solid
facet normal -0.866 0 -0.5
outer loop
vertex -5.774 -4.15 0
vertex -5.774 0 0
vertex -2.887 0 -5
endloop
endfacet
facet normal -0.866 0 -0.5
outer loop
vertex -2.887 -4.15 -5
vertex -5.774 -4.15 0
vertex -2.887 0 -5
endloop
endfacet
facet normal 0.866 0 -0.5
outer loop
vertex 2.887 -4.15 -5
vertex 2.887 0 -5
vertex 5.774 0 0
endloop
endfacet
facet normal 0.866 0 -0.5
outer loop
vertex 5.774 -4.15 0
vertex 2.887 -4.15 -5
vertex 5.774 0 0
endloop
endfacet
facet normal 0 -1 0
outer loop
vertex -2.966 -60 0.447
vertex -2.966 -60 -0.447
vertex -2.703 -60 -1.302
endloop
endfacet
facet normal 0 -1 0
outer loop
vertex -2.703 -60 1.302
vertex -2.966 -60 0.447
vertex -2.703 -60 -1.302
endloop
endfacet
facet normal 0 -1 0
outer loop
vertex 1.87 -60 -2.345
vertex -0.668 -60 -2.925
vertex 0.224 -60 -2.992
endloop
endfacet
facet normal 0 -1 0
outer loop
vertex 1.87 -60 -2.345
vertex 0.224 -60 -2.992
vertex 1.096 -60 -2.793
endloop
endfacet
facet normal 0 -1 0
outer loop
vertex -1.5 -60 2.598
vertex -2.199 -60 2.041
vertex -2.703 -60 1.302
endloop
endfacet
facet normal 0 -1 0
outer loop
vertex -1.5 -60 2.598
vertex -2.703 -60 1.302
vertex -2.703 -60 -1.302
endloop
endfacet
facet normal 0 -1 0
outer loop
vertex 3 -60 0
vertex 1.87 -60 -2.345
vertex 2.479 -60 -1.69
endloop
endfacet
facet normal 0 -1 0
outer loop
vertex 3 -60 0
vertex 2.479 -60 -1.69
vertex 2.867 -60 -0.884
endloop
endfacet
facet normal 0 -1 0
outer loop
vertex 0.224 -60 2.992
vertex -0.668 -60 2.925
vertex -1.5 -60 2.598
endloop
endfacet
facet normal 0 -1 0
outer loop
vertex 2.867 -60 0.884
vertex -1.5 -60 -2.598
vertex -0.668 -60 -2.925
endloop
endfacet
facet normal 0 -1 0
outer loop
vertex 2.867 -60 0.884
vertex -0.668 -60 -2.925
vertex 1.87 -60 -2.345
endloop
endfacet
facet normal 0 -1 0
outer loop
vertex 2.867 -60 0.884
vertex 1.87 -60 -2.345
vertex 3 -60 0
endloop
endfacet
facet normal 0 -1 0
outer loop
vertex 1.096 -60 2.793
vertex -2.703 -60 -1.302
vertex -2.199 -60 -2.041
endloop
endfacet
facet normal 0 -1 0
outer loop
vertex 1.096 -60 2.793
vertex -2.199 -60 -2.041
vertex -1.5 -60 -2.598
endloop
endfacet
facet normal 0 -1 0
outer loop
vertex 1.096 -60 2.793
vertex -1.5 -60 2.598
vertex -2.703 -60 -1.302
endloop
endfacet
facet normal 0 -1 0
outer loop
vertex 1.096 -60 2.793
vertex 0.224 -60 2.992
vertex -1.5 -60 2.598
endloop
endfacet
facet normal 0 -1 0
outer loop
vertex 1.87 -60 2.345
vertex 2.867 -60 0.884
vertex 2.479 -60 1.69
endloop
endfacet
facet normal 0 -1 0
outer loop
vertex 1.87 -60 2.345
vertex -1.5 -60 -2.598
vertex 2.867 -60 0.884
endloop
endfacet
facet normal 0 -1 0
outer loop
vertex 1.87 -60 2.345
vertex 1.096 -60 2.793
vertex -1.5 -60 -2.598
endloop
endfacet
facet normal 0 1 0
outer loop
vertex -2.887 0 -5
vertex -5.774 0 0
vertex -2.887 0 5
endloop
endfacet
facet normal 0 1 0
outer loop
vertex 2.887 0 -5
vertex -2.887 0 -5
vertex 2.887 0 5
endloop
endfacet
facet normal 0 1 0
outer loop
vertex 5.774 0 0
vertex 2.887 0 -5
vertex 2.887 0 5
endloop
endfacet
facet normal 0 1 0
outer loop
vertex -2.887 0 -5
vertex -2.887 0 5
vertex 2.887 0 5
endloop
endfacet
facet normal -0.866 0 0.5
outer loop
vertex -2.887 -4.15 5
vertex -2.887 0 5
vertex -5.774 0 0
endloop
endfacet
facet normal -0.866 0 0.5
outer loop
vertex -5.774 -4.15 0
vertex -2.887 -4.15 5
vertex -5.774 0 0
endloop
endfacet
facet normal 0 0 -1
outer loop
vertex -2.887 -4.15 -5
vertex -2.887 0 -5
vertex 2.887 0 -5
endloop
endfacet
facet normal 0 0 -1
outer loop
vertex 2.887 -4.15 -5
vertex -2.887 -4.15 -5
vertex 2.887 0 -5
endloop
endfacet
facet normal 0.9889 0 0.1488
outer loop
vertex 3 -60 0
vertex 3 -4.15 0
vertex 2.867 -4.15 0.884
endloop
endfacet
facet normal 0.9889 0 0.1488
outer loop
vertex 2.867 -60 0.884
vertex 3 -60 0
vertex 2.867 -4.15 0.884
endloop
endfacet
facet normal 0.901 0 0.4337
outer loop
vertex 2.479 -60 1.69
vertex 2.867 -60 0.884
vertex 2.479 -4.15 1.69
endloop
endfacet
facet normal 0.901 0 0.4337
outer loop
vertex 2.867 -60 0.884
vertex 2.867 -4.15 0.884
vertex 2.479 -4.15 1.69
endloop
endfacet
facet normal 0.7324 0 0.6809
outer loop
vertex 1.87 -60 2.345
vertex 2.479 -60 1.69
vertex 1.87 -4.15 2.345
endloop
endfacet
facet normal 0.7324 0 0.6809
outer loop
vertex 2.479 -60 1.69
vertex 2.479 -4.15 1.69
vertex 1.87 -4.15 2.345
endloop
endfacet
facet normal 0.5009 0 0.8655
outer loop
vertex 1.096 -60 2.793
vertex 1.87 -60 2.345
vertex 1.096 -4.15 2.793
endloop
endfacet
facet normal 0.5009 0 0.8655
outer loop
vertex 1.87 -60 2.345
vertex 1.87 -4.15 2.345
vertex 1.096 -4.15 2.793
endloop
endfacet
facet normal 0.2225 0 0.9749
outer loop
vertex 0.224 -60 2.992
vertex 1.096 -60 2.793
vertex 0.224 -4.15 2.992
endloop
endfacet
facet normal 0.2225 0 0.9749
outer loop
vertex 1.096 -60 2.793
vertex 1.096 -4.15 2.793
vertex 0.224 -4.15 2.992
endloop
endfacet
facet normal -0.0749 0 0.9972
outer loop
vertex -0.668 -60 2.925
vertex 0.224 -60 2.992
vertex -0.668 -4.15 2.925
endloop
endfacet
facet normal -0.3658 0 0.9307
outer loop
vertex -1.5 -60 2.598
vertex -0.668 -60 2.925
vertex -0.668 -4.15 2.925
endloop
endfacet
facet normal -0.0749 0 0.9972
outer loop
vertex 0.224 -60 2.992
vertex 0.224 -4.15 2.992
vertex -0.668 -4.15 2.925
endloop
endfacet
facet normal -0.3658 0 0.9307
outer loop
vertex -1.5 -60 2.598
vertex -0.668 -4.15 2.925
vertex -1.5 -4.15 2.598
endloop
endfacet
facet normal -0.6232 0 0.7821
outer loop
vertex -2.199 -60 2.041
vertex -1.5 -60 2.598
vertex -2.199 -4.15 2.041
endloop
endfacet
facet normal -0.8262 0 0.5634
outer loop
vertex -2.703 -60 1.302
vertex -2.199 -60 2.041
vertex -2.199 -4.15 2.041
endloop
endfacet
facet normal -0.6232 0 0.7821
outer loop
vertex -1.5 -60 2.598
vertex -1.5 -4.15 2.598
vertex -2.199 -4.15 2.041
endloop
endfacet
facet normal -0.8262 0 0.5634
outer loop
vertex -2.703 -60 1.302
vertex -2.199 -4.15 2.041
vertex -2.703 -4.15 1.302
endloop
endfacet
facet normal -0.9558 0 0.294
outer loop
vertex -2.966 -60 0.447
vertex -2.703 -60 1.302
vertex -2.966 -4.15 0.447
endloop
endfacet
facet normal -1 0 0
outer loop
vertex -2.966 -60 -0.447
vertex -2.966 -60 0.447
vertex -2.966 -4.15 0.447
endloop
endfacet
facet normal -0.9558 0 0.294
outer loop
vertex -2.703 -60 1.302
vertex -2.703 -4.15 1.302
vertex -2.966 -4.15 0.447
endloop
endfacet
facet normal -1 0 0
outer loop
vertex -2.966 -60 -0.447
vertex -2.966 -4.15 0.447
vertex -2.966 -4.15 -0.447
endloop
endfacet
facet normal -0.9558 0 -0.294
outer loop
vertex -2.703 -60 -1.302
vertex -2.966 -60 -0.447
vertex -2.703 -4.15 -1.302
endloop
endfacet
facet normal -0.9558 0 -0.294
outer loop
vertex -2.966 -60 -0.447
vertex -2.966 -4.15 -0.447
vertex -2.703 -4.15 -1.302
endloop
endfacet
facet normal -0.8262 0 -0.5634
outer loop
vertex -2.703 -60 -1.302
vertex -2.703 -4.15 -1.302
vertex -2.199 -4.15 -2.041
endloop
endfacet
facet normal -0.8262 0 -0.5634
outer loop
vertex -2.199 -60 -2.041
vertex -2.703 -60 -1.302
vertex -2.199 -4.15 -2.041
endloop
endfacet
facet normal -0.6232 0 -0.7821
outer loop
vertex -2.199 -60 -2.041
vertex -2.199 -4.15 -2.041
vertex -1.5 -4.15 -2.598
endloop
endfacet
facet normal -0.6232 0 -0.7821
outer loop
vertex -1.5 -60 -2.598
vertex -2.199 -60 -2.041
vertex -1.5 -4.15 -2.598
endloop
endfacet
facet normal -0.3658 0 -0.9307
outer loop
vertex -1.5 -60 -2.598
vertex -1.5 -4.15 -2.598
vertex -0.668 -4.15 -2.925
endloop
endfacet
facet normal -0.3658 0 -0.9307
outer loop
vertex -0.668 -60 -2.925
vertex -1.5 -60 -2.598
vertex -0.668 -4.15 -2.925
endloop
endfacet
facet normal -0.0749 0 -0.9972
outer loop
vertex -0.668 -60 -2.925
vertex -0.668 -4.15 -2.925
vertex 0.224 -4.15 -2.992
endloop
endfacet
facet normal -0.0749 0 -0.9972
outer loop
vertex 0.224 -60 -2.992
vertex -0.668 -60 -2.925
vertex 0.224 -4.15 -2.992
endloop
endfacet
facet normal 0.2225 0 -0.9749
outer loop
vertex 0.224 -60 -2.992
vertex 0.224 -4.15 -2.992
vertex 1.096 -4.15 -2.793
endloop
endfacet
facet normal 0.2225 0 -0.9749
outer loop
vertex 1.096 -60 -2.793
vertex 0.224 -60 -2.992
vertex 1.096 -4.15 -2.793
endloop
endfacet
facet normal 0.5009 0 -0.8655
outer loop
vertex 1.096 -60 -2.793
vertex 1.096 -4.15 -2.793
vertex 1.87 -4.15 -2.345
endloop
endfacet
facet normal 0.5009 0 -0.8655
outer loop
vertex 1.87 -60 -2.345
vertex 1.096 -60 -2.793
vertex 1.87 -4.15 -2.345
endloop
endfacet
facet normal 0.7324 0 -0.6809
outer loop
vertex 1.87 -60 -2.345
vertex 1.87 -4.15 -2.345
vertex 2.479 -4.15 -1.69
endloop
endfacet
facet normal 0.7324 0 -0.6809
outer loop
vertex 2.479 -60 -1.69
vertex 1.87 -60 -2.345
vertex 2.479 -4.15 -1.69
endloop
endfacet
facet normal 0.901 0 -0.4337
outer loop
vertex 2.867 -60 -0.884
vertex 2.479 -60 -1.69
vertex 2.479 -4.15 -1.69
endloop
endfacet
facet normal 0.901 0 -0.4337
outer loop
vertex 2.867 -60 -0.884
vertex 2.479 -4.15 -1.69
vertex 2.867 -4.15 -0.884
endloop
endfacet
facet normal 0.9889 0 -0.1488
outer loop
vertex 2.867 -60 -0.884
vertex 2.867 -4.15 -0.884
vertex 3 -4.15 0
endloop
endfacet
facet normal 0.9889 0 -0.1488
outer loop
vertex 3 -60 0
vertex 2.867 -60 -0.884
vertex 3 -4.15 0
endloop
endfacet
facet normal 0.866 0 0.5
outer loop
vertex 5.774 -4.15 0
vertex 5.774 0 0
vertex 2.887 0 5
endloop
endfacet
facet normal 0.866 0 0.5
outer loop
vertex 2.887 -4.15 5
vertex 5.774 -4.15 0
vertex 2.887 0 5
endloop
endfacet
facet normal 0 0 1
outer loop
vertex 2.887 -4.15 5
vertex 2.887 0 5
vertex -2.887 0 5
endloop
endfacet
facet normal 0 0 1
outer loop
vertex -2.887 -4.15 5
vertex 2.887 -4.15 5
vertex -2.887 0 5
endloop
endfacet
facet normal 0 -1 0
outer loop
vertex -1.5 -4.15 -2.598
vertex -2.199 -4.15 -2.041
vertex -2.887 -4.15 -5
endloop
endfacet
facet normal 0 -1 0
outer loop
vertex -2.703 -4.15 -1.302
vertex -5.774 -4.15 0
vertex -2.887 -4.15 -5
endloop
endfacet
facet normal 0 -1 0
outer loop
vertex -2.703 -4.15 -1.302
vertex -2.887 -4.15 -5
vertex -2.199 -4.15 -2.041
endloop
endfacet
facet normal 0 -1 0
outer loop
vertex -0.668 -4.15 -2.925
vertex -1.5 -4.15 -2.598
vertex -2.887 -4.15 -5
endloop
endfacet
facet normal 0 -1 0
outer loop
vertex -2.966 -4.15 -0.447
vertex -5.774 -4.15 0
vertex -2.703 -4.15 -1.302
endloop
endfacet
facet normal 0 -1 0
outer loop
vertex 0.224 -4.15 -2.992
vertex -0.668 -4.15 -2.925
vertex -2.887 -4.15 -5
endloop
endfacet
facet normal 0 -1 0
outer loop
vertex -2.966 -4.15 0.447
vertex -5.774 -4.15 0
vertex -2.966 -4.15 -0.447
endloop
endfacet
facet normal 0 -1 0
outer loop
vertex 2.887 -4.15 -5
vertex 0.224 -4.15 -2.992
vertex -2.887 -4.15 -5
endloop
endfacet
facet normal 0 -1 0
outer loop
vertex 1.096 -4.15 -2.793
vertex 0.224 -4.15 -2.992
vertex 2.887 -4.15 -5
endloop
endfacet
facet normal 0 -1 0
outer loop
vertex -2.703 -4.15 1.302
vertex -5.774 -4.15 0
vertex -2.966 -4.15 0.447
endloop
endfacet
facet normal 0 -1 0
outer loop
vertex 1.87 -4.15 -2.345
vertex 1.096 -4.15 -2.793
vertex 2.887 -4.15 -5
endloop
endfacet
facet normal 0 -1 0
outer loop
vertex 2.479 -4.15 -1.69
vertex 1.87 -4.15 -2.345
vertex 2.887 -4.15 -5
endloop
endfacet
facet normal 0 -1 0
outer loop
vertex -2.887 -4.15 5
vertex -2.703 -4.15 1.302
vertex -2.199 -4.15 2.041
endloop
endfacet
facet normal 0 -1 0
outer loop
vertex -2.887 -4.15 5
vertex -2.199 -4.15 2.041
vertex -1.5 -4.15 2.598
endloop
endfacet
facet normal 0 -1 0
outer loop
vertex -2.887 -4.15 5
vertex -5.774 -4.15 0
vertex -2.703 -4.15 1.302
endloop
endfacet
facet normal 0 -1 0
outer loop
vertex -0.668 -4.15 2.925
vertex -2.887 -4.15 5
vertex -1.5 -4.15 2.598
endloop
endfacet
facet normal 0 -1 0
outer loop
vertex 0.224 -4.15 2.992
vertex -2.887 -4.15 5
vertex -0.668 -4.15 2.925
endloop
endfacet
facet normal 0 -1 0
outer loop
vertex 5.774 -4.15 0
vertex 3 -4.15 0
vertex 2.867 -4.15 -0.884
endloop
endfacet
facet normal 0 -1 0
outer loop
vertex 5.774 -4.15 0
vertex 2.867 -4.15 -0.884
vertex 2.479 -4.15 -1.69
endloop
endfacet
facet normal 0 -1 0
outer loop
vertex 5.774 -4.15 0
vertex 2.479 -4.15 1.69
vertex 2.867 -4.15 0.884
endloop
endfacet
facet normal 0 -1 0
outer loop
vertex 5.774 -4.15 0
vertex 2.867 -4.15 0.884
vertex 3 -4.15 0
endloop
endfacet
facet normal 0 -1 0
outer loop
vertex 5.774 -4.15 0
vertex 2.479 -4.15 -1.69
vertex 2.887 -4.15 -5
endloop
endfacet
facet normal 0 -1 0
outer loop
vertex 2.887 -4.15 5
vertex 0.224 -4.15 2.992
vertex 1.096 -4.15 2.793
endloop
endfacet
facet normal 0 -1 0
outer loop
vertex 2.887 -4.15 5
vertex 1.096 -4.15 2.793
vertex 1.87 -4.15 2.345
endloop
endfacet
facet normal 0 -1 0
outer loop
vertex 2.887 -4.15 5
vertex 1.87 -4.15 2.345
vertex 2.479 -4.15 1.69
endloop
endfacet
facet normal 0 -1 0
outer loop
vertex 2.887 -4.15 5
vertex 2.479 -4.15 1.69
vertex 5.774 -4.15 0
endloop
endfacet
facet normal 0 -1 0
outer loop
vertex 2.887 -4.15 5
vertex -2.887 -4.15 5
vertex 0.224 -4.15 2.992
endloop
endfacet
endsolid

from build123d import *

# Parameters (mm, degrees)
F0_R     = 3
F1_DEPTH = 4.15
F2_DEPTH = 60


with BuildPart() as f1:
    # F0 (on Front) → F1 (new body)
    with BuildSketch(Plane.XZ):
        Polygon((2.886751, 5), (-2.886751, 5), (-5.773503, 0), (-2.886751, -5), (2.886751, -5), (5.773503, 0), align=None)
        Circle(F0_R, mode=Mode.SUBTRACT)
        Circle(F0_R)
    extrude(amount=F1_DEPTH)

    # F0 (on Front) → F2 (join)
    with BuildSketch(Plane.XZ):
        Circle(F0_R)
    extrude(amount=F2_DEPTH)


solid = f1.part
